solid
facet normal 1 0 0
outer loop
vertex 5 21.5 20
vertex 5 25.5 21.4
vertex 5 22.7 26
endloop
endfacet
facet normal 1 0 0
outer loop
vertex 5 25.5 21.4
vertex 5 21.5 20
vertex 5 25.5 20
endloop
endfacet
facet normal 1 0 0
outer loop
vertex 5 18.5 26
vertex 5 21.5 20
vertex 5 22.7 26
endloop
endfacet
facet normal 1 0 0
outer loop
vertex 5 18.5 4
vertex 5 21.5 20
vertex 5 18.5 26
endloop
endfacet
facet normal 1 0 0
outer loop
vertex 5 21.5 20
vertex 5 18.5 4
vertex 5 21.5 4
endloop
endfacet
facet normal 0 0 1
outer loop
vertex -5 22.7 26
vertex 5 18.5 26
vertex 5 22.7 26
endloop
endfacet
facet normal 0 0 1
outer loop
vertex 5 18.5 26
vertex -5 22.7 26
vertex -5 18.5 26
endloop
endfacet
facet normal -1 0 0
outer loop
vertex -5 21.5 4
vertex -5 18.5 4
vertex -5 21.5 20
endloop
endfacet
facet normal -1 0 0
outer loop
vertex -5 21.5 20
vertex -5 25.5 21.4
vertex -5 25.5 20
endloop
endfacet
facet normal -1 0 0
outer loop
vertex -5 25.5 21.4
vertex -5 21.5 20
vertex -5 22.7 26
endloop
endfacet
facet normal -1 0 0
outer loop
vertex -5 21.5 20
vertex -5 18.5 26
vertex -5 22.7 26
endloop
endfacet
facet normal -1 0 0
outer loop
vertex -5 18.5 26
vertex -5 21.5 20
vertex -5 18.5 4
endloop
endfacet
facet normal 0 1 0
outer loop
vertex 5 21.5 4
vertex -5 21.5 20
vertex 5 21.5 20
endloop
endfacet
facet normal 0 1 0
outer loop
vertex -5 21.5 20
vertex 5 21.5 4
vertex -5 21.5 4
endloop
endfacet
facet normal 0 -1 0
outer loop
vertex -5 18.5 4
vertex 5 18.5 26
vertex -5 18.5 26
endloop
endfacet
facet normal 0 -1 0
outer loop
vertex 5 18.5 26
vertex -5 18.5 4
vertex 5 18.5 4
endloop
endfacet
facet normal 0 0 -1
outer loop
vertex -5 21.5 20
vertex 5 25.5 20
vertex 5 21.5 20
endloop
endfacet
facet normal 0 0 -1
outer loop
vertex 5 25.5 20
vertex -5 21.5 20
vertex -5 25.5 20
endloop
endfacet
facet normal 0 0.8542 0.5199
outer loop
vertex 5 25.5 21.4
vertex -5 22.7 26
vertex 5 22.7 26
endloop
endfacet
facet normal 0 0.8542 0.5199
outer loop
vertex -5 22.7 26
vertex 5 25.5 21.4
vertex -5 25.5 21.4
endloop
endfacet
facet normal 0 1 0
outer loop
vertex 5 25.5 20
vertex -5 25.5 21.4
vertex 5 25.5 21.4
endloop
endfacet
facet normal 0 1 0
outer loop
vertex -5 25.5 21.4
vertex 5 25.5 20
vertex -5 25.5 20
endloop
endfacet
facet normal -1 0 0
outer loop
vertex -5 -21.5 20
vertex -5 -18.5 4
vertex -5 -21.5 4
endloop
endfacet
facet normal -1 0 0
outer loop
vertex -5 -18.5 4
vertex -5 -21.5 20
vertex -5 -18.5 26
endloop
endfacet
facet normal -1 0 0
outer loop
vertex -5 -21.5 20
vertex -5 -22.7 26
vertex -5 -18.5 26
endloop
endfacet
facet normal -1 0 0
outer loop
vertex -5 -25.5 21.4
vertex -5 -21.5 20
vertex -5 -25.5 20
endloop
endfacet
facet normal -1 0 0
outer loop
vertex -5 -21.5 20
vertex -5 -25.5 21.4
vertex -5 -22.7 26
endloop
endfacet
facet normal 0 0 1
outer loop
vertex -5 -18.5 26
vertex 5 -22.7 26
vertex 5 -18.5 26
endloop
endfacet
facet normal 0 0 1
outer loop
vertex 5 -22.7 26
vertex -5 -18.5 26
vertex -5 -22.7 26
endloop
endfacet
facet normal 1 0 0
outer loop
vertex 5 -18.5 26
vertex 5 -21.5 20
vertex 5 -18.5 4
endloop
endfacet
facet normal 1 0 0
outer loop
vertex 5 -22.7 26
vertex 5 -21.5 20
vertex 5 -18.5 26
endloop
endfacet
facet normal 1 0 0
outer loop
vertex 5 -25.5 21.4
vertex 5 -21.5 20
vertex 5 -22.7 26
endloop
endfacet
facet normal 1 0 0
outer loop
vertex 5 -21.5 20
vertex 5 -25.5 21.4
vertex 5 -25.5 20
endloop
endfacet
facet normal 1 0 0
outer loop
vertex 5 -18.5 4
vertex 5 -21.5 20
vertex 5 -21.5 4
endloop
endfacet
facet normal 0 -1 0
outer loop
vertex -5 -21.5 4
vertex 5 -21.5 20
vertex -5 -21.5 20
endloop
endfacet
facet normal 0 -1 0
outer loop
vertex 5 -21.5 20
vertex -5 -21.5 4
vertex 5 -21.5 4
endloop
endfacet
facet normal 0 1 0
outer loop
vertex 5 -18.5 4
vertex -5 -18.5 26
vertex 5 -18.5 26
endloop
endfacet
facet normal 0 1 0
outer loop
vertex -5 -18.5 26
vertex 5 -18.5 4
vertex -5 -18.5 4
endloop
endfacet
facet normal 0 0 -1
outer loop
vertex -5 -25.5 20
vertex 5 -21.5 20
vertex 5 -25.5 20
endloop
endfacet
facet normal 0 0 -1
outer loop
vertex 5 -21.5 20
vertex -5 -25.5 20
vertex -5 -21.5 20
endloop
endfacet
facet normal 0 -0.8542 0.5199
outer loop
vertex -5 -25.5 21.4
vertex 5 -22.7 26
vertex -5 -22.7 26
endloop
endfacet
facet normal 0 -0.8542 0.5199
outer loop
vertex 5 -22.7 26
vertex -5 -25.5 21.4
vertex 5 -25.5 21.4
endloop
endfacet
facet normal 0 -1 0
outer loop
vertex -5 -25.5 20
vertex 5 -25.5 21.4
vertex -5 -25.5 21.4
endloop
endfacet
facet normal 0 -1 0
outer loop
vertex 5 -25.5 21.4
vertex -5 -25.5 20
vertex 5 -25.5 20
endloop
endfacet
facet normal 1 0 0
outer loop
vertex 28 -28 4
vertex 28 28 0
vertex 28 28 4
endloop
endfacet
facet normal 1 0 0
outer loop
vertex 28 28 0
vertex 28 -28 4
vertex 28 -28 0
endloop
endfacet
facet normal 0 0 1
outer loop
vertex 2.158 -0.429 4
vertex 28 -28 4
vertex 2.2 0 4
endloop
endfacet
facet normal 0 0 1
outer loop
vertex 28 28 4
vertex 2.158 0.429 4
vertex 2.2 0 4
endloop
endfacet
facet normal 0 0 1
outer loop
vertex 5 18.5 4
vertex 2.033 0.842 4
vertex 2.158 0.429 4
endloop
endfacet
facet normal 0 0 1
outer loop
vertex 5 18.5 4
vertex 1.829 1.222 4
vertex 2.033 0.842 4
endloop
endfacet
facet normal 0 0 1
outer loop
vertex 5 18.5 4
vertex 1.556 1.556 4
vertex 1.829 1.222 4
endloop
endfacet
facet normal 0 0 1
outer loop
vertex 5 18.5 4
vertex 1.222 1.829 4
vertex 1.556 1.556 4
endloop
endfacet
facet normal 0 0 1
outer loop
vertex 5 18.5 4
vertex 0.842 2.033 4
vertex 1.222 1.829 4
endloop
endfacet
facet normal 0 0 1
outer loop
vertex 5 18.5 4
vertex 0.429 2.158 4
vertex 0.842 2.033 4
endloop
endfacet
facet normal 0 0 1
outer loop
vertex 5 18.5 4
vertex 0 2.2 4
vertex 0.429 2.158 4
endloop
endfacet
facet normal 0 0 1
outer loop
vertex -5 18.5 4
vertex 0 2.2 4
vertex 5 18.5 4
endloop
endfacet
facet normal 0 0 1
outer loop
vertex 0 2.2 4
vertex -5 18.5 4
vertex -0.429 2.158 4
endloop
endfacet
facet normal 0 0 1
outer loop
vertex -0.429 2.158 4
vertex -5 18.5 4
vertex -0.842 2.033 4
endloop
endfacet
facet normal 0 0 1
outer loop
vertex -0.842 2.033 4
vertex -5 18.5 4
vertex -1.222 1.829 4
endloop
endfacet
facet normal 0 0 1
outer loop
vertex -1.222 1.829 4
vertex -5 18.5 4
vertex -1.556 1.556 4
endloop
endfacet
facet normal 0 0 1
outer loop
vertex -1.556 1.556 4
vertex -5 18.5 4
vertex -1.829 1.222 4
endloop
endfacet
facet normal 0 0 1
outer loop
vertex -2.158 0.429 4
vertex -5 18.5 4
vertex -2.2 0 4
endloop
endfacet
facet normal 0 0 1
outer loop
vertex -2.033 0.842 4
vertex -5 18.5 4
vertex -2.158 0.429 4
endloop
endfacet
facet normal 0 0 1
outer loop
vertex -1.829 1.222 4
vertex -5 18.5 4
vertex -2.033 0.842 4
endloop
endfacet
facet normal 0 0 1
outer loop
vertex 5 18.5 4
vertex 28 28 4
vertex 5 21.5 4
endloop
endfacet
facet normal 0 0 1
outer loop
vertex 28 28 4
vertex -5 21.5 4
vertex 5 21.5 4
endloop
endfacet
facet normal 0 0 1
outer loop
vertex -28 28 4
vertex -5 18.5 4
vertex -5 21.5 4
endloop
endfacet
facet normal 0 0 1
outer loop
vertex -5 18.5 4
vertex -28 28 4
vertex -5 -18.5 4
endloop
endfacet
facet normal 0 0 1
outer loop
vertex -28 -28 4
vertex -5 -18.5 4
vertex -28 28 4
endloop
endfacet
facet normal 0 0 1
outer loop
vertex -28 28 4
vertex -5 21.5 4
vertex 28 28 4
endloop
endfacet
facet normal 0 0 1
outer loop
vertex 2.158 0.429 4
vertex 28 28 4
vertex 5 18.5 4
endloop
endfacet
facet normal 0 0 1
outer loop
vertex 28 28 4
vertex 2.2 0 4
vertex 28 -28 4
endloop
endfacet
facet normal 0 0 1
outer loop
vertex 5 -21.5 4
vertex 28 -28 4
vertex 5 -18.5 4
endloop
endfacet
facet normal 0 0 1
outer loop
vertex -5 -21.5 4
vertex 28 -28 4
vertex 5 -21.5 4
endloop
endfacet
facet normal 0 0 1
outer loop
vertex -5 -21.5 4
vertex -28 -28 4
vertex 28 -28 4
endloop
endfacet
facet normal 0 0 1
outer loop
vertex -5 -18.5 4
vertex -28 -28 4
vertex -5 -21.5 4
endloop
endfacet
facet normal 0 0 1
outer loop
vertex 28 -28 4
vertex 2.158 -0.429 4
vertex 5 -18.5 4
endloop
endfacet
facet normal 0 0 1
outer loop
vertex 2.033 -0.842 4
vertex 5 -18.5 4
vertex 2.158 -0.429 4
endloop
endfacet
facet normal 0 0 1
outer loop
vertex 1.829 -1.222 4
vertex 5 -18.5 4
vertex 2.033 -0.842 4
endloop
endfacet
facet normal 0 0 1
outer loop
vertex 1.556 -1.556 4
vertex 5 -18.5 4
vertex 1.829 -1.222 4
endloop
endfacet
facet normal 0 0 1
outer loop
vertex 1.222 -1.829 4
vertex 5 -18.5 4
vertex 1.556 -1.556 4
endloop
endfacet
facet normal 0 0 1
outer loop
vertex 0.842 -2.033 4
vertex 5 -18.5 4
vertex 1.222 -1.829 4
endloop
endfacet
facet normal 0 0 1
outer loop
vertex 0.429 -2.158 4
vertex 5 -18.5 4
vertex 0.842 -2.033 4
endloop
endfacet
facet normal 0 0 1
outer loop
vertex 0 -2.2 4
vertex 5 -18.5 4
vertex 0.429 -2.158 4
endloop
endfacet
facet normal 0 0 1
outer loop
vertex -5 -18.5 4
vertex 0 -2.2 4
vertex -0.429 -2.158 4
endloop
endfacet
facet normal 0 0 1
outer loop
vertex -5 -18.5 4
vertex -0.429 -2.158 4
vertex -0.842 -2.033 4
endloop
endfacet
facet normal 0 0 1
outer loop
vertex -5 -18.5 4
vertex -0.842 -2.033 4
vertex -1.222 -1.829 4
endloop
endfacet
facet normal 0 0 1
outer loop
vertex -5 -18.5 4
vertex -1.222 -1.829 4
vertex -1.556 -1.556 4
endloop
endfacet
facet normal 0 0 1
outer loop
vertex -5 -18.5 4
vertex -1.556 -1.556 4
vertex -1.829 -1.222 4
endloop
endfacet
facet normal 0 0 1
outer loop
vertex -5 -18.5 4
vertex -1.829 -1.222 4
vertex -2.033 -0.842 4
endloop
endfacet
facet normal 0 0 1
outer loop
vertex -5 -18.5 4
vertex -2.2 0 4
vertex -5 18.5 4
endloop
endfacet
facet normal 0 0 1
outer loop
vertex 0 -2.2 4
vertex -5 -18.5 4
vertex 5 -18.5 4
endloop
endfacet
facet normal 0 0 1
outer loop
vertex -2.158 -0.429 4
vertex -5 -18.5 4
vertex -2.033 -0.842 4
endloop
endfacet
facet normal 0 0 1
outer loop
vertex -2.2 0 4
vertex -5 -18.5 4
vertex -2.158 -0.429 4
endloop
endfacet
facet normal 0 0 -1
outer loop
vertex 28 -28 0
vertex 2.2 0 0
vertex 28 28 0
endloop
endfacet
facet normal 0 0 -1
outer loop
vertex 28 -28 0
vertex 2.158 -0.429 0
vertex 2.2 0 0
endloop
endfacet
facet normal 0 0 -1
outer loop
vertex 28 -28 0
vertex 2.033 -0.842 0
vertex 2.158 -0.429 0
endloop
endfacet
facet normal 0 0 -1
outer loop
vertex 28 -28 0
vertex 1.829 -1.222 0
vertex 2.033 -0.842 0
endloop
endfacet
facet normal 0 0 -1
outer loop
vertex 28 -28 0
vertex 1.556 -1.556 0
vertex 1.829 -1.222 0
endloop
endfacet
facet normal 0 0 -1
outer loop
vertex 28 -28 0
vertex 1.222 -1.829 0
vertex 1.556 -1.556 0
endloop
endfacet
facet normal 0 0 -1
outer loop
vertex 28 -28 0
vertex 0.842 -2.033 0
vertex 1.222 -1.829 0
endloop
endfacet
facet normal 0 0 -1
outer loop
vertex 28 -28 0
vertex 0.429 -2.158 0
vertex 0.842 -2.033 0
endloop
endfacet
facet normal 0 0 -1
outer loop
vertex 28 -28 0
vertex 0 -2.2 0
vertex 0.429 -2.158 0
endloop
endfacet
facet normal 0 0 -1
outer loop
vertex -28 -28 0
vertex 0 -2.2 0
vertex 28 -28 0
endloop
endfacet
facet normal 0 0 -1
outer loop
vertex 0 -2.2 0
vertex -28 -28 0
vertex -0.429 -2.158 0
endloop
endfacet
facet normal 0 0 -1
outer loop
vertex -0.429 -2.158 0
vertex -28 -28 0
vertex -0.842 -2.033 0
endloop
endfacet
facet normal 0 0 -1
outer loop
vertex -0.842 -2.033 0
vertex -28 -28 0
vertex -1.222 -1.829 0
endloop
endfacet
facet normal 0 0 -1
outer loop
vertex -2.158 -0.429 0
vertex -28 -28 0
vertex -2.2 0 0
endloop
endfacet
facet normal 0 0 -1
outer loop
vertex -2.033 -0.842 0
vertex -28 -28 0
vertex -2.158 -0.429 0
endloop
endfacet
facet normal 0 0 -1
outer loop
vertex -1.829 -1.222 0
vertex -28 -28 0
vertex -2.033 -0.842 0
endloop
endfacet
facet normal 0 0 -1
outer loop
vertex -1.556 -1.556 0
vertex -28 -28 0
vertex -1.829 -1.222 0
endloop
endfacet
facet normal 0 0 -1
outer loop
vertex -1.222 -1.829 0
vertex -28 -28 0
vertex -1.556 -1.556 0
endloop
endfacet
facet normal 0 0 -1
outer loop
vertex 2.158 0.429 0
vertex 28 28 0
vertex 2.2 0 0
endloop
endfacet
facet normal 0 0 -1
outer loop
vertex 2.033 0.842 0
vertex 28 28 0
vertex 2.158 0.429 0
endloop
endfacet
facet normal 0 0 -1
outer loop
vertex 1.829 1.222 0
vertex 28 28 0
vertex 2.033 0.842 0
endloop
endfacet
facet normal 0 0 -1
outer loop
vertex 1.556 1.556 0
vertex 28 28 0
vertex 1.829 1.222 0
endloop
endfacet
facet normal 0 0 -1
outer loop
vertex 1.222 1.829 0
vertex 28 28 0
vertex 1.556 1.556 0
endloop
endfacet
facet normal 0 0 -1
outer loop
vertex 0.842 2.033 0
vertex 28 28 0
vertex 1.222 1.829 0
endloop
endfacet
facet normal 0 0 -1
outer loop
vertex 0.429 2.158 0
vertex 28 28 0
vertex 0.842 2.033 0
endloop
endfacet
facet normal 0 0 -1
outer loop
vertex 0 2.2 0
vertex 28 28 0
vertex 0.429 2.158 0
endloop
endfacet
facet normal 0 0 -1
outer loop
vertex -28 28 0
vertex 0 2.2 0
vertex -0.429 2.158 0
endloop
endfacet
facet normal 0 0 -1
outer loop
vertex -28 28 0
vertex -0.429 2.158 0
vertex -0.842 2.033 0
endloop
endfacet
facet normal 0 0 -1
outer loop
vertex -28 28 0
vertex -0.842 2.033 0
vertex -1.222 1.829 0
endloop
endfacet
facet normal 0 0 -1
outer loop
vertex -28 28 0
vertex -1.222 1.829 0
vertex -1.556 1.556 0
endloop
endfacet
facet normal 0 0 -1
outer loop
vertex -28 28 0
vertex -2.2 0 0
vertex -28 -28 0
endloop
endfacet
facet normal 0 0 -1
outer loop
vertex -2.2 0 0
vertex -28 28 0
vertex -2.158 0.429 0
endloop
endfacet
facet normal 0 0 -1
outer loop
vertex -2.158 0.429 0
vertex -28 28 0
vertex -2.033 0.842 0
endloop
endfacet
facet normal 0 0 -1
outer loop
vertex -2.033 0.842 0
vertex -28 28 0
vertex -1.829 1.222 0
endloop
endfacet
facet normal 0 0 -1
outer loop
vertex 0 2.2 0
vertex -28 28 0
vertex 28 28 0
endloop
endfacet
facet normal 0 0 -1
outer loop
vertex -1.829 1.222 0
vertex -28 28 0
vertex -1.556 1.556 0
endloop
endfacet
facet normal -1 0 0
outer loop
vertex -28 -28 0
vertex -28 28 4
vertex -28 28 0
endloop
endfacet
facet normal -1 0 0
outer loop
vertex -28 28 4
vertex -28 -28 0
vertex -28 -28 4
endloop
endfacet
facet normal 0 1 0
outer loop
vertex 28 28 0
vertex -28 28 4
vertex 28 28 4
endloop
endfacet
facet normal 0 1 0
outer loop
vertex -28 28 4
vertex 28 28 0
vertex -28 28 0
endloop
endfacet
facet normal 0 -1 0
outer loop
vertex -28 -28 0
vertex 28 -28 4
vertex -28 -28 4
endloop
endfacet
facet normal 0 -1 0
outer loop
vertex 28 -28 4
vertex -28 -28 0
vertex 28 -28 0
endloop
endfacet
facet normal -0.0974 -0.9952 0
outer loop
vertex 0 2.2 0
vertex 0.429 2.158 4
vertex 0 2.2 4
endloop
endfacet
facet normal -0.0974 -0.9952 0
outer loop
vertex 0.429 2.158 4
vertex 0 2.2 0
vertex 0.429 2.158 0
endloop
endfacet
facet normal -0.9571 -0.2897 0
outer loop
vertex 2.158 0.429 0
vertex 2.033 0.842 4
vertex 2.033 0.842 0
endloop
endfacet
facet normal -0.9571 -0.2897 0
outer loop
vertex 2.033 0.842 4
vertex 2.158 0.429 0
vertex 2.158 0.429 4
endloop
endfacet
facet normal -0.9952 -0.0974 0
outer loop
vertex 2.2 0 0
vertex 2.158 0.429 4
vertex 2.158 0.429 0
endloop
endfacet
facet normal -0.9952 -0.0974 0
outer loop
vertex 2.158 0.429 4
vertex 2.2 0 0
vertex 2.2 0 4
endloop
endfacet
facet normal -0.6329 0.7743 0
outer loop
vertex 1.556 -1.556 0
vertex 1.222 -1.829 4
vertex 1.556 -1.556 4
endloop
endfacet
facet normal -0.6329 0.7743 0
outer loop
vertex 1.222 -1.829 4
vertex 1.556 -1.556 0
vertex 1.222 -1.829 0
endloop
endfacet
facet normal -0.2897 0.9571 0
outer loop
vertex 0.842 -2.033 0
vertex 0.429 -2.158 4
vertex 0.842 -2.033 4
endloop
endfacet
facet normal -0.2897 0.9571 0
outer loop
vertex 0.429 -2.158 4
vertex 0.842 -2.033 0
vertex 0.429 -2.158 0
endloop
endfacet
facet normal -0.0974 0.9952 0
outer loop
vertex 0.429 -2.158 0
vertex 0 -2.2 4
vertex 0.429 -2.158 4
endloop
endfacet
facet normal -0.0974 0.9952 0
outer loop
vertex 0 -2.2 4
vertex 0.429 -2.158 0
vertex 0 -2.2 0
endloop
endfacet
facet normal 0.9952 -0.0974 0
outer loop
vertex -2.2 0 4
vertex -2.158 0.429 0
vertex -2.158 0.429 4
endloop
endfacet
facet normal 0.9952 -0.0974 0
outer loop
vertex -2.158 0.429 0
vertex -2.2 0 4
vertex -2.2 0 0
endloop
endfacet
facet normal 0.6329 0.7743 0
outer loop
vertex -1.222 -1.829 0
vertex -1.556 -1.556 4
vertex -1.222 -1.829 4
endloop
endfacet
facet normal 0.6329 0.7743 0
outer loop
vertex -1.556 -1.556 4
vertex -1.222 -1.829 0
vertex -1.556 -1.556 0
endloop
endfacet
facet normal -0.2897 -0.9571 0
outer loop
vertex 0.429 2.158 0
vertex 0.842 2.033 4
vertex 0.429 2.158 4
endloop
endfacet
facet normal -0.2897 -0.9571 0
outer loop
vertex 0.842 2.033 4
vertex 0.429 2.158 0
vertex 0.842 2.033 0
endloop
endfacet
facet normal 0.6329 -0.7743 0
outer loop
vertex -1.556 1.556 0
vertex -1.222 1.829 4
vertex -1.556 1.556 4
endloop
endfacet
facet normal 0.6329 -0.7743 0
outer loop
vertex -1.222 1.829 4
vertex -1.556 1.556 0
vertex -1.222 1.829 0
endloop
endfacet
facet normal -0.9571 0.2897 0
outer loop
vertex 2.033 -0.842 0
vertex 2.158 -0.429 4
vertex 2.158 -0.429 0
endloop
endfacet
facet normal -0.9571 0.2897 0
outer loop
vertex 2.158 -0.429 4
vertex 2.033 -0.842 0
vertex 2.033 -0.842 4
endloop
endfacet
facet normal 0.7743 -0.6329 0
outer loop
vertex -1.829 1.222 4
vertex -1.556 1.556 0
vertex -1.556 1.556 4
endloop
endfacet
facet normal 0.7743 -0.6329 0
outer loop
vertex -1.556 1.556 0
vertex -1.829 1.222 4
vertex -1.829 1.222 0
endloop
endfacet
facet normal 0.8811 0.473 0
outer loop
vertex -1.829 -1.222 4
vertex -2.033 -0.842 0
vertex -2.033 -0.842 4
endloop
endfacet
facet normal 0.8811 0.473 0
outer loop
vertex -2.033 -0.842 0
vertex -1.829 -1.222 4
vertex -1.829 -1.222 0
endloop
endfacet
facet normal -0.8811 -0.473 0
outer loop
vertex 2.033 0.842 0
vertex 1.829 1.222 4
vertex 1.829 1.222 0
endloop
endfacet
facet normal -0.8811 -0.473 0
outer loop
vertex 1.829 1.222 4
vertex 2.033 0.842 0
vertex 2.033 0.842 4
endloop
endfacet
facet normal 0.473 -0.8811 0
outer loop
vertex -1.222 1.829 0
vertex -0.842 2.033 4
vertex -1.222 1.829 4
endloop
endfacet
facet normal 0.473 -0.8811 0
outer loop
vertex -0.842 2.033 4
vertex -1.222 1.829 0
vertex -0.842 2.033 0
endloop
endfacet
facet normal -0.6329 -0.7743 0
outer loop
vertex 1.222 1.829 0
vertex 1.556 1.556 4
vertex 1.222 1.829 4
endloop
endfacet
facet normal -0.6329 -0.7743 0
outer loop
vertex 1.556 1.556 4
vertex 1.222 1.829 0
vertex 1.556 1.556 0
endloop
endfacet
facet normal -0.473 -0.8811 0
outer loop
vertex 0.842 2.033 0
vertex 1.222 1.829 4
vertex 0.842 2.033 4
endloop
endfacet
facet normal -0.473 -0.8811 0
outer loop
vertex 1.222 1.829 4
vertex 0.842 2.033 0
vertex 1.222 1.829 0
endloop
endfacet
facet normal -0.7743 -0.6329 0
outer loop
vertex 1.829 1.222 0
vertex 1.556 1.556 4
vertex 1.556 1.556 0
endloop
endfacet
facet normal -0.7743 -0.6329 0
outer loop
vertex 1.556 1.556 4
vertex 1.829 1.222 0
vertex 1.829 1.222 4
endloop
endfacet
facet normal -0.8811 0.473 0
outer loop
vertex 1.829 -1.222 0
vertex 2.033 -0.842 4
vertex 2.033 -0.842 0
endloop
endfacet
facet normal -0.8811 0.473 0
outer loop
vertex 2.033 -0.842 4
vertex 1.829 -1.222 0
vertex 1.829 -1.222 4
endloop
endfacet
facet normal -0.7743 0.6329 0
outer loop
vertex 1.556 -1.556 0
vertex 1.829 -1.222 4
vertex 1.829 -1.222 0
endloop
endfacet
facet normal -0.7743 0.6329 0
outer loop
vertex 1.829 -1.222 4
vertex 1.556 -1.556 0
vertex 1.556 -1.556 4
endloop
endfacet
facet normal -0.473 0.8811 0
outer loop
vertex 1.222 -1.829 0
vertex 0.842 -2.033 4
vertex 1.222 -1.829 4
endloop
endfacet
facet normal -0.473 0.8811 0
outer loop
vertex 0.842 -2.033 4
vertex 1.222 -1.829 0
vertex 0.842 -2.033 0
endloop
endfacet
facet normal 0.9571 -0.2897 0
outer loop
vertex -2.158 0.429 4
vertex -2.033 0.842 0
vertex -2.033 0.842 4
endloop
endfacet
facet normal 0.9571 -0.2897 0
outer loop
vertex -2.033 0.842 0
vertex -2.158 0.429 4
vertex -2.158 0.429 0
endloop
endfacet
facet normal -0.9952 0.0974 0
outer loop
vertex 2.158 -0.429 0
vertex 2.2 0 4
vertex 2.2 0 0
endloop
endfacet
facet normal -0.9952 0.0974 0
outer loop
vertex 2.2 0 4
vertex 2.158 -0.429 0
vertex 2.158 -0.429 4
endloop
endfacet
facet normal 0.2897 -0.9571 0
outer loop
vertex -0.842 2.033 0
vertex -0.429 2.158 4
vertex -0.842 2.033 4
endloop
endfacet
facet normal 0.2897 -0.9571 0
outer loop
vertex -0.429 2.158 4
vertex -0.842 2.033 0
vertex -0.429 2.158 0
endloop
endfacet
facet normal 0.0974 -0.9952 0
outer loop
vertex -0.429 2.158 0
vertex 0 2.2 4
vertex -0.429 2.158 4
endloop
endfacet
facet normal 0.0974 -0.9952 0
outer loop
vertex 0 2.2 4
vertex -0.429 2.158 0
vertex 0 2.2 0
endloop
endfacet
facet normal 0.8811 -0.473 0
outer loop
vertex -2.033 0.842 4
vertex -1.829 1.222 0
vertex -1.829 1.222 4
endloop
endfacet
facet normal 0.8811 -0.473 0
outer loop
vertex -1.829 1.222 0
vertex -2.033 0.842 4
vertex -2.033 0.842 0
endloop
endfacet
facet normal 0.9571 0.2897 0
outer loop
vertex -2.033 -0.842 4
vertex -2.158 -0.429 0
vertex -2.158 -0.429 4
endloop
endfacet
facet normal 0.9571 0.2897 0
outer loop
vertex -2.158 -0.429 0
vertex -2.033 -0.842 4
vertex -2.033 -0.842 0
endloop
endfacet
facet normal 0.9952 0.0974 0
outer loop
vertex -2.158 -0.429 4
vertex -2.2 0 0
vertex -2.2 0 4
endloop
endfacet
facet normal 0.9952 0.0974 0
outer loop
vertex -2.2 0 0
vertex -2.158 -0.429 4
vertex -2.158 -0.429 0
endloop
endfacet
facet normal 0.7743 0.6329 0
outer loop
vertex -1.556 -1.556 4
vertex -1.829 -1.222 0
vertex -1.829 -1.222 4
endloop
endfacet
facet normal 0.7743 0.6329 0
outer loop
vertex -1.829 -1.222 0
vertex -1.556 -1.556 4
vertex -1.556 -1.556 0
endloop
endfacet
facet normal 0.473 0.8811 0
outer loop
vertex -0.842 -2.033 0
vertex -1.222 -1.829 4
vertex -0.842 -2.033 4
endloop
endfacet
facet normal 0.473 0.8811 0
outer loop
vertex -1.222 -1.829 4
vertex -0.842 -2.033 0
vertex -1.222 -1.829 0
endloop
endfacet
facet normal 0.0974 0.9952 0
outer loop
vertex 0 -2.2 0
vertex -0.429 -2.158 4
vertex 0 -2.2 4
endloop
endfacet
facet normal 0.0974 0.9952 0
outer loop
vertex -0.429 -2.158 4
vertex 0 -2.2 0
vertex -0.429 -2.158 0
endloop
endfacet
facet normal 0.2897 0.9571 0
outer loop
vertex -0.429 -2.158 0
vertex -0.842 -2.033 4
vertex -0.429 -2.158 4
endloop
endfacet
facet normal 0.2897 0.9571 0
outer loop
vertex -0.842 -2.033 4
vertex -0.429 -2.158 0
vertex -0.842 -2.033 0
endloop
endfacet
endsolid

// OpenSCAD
$fn = 32;
// ----------------------------------------------------------------------
// Snap-fit latch: 2 arms, 22 mm tall, 4.2 mm undercut hooks
// ----------------------------------------------------------------------

// --- parameters (mm) ---
base_d = 56;              // base plate depth
base_h = 4;               // base plate thickness
span = 40;                // distance between opposite arms
arm_t = 3;                // arm thickness
arm_d = 10;               // arm width
height = 22;              // free arm length
head_len = 4.2;           // hook reach
head_h = 6;               // hook height
lead = 1.4;               // lead-in ramp thickness
bore_d = 4.4;             // base fixing bore
top_z = 26;               // height of the arm tips above the base

arms = 2;

difference() {
  union() {
    /* base plate, centred on the arm ring */
    translate([-28, -28, 0]) cube([base_d, base_d, base_h]);
    for (a = [0 : 360 / arms : 359]) rotate([0, 0, a]) {
    /* arm, sunk 0.5 mm into the base */
    translate([-arm_d / 2, span / 2 - arm_t / 2, base_h - 0.5]) cube([arm_d, arm_t, height + 0.5]);
    /* hook: a convex hull of a tall inner block and a thin outer lip
       gives a flat undercut below and a lead-in ramp on top */
    hull() {
      translate([-arm_d / 2, span / 2 + arm_t / 2 - 0.6, top_z - head_h]) cube([arm_d, lead + 0.4, head_h]);
      translate([-arm_d / 2, span / 2 + arm_t / 2 - 0.2, top_z - head_h]) cube([arm_d, head_len, lead]);
    }
    }
  }
  translate([0, 0, -2.5]) cylinder(h = base_h + 5, d = bore_d);
}
